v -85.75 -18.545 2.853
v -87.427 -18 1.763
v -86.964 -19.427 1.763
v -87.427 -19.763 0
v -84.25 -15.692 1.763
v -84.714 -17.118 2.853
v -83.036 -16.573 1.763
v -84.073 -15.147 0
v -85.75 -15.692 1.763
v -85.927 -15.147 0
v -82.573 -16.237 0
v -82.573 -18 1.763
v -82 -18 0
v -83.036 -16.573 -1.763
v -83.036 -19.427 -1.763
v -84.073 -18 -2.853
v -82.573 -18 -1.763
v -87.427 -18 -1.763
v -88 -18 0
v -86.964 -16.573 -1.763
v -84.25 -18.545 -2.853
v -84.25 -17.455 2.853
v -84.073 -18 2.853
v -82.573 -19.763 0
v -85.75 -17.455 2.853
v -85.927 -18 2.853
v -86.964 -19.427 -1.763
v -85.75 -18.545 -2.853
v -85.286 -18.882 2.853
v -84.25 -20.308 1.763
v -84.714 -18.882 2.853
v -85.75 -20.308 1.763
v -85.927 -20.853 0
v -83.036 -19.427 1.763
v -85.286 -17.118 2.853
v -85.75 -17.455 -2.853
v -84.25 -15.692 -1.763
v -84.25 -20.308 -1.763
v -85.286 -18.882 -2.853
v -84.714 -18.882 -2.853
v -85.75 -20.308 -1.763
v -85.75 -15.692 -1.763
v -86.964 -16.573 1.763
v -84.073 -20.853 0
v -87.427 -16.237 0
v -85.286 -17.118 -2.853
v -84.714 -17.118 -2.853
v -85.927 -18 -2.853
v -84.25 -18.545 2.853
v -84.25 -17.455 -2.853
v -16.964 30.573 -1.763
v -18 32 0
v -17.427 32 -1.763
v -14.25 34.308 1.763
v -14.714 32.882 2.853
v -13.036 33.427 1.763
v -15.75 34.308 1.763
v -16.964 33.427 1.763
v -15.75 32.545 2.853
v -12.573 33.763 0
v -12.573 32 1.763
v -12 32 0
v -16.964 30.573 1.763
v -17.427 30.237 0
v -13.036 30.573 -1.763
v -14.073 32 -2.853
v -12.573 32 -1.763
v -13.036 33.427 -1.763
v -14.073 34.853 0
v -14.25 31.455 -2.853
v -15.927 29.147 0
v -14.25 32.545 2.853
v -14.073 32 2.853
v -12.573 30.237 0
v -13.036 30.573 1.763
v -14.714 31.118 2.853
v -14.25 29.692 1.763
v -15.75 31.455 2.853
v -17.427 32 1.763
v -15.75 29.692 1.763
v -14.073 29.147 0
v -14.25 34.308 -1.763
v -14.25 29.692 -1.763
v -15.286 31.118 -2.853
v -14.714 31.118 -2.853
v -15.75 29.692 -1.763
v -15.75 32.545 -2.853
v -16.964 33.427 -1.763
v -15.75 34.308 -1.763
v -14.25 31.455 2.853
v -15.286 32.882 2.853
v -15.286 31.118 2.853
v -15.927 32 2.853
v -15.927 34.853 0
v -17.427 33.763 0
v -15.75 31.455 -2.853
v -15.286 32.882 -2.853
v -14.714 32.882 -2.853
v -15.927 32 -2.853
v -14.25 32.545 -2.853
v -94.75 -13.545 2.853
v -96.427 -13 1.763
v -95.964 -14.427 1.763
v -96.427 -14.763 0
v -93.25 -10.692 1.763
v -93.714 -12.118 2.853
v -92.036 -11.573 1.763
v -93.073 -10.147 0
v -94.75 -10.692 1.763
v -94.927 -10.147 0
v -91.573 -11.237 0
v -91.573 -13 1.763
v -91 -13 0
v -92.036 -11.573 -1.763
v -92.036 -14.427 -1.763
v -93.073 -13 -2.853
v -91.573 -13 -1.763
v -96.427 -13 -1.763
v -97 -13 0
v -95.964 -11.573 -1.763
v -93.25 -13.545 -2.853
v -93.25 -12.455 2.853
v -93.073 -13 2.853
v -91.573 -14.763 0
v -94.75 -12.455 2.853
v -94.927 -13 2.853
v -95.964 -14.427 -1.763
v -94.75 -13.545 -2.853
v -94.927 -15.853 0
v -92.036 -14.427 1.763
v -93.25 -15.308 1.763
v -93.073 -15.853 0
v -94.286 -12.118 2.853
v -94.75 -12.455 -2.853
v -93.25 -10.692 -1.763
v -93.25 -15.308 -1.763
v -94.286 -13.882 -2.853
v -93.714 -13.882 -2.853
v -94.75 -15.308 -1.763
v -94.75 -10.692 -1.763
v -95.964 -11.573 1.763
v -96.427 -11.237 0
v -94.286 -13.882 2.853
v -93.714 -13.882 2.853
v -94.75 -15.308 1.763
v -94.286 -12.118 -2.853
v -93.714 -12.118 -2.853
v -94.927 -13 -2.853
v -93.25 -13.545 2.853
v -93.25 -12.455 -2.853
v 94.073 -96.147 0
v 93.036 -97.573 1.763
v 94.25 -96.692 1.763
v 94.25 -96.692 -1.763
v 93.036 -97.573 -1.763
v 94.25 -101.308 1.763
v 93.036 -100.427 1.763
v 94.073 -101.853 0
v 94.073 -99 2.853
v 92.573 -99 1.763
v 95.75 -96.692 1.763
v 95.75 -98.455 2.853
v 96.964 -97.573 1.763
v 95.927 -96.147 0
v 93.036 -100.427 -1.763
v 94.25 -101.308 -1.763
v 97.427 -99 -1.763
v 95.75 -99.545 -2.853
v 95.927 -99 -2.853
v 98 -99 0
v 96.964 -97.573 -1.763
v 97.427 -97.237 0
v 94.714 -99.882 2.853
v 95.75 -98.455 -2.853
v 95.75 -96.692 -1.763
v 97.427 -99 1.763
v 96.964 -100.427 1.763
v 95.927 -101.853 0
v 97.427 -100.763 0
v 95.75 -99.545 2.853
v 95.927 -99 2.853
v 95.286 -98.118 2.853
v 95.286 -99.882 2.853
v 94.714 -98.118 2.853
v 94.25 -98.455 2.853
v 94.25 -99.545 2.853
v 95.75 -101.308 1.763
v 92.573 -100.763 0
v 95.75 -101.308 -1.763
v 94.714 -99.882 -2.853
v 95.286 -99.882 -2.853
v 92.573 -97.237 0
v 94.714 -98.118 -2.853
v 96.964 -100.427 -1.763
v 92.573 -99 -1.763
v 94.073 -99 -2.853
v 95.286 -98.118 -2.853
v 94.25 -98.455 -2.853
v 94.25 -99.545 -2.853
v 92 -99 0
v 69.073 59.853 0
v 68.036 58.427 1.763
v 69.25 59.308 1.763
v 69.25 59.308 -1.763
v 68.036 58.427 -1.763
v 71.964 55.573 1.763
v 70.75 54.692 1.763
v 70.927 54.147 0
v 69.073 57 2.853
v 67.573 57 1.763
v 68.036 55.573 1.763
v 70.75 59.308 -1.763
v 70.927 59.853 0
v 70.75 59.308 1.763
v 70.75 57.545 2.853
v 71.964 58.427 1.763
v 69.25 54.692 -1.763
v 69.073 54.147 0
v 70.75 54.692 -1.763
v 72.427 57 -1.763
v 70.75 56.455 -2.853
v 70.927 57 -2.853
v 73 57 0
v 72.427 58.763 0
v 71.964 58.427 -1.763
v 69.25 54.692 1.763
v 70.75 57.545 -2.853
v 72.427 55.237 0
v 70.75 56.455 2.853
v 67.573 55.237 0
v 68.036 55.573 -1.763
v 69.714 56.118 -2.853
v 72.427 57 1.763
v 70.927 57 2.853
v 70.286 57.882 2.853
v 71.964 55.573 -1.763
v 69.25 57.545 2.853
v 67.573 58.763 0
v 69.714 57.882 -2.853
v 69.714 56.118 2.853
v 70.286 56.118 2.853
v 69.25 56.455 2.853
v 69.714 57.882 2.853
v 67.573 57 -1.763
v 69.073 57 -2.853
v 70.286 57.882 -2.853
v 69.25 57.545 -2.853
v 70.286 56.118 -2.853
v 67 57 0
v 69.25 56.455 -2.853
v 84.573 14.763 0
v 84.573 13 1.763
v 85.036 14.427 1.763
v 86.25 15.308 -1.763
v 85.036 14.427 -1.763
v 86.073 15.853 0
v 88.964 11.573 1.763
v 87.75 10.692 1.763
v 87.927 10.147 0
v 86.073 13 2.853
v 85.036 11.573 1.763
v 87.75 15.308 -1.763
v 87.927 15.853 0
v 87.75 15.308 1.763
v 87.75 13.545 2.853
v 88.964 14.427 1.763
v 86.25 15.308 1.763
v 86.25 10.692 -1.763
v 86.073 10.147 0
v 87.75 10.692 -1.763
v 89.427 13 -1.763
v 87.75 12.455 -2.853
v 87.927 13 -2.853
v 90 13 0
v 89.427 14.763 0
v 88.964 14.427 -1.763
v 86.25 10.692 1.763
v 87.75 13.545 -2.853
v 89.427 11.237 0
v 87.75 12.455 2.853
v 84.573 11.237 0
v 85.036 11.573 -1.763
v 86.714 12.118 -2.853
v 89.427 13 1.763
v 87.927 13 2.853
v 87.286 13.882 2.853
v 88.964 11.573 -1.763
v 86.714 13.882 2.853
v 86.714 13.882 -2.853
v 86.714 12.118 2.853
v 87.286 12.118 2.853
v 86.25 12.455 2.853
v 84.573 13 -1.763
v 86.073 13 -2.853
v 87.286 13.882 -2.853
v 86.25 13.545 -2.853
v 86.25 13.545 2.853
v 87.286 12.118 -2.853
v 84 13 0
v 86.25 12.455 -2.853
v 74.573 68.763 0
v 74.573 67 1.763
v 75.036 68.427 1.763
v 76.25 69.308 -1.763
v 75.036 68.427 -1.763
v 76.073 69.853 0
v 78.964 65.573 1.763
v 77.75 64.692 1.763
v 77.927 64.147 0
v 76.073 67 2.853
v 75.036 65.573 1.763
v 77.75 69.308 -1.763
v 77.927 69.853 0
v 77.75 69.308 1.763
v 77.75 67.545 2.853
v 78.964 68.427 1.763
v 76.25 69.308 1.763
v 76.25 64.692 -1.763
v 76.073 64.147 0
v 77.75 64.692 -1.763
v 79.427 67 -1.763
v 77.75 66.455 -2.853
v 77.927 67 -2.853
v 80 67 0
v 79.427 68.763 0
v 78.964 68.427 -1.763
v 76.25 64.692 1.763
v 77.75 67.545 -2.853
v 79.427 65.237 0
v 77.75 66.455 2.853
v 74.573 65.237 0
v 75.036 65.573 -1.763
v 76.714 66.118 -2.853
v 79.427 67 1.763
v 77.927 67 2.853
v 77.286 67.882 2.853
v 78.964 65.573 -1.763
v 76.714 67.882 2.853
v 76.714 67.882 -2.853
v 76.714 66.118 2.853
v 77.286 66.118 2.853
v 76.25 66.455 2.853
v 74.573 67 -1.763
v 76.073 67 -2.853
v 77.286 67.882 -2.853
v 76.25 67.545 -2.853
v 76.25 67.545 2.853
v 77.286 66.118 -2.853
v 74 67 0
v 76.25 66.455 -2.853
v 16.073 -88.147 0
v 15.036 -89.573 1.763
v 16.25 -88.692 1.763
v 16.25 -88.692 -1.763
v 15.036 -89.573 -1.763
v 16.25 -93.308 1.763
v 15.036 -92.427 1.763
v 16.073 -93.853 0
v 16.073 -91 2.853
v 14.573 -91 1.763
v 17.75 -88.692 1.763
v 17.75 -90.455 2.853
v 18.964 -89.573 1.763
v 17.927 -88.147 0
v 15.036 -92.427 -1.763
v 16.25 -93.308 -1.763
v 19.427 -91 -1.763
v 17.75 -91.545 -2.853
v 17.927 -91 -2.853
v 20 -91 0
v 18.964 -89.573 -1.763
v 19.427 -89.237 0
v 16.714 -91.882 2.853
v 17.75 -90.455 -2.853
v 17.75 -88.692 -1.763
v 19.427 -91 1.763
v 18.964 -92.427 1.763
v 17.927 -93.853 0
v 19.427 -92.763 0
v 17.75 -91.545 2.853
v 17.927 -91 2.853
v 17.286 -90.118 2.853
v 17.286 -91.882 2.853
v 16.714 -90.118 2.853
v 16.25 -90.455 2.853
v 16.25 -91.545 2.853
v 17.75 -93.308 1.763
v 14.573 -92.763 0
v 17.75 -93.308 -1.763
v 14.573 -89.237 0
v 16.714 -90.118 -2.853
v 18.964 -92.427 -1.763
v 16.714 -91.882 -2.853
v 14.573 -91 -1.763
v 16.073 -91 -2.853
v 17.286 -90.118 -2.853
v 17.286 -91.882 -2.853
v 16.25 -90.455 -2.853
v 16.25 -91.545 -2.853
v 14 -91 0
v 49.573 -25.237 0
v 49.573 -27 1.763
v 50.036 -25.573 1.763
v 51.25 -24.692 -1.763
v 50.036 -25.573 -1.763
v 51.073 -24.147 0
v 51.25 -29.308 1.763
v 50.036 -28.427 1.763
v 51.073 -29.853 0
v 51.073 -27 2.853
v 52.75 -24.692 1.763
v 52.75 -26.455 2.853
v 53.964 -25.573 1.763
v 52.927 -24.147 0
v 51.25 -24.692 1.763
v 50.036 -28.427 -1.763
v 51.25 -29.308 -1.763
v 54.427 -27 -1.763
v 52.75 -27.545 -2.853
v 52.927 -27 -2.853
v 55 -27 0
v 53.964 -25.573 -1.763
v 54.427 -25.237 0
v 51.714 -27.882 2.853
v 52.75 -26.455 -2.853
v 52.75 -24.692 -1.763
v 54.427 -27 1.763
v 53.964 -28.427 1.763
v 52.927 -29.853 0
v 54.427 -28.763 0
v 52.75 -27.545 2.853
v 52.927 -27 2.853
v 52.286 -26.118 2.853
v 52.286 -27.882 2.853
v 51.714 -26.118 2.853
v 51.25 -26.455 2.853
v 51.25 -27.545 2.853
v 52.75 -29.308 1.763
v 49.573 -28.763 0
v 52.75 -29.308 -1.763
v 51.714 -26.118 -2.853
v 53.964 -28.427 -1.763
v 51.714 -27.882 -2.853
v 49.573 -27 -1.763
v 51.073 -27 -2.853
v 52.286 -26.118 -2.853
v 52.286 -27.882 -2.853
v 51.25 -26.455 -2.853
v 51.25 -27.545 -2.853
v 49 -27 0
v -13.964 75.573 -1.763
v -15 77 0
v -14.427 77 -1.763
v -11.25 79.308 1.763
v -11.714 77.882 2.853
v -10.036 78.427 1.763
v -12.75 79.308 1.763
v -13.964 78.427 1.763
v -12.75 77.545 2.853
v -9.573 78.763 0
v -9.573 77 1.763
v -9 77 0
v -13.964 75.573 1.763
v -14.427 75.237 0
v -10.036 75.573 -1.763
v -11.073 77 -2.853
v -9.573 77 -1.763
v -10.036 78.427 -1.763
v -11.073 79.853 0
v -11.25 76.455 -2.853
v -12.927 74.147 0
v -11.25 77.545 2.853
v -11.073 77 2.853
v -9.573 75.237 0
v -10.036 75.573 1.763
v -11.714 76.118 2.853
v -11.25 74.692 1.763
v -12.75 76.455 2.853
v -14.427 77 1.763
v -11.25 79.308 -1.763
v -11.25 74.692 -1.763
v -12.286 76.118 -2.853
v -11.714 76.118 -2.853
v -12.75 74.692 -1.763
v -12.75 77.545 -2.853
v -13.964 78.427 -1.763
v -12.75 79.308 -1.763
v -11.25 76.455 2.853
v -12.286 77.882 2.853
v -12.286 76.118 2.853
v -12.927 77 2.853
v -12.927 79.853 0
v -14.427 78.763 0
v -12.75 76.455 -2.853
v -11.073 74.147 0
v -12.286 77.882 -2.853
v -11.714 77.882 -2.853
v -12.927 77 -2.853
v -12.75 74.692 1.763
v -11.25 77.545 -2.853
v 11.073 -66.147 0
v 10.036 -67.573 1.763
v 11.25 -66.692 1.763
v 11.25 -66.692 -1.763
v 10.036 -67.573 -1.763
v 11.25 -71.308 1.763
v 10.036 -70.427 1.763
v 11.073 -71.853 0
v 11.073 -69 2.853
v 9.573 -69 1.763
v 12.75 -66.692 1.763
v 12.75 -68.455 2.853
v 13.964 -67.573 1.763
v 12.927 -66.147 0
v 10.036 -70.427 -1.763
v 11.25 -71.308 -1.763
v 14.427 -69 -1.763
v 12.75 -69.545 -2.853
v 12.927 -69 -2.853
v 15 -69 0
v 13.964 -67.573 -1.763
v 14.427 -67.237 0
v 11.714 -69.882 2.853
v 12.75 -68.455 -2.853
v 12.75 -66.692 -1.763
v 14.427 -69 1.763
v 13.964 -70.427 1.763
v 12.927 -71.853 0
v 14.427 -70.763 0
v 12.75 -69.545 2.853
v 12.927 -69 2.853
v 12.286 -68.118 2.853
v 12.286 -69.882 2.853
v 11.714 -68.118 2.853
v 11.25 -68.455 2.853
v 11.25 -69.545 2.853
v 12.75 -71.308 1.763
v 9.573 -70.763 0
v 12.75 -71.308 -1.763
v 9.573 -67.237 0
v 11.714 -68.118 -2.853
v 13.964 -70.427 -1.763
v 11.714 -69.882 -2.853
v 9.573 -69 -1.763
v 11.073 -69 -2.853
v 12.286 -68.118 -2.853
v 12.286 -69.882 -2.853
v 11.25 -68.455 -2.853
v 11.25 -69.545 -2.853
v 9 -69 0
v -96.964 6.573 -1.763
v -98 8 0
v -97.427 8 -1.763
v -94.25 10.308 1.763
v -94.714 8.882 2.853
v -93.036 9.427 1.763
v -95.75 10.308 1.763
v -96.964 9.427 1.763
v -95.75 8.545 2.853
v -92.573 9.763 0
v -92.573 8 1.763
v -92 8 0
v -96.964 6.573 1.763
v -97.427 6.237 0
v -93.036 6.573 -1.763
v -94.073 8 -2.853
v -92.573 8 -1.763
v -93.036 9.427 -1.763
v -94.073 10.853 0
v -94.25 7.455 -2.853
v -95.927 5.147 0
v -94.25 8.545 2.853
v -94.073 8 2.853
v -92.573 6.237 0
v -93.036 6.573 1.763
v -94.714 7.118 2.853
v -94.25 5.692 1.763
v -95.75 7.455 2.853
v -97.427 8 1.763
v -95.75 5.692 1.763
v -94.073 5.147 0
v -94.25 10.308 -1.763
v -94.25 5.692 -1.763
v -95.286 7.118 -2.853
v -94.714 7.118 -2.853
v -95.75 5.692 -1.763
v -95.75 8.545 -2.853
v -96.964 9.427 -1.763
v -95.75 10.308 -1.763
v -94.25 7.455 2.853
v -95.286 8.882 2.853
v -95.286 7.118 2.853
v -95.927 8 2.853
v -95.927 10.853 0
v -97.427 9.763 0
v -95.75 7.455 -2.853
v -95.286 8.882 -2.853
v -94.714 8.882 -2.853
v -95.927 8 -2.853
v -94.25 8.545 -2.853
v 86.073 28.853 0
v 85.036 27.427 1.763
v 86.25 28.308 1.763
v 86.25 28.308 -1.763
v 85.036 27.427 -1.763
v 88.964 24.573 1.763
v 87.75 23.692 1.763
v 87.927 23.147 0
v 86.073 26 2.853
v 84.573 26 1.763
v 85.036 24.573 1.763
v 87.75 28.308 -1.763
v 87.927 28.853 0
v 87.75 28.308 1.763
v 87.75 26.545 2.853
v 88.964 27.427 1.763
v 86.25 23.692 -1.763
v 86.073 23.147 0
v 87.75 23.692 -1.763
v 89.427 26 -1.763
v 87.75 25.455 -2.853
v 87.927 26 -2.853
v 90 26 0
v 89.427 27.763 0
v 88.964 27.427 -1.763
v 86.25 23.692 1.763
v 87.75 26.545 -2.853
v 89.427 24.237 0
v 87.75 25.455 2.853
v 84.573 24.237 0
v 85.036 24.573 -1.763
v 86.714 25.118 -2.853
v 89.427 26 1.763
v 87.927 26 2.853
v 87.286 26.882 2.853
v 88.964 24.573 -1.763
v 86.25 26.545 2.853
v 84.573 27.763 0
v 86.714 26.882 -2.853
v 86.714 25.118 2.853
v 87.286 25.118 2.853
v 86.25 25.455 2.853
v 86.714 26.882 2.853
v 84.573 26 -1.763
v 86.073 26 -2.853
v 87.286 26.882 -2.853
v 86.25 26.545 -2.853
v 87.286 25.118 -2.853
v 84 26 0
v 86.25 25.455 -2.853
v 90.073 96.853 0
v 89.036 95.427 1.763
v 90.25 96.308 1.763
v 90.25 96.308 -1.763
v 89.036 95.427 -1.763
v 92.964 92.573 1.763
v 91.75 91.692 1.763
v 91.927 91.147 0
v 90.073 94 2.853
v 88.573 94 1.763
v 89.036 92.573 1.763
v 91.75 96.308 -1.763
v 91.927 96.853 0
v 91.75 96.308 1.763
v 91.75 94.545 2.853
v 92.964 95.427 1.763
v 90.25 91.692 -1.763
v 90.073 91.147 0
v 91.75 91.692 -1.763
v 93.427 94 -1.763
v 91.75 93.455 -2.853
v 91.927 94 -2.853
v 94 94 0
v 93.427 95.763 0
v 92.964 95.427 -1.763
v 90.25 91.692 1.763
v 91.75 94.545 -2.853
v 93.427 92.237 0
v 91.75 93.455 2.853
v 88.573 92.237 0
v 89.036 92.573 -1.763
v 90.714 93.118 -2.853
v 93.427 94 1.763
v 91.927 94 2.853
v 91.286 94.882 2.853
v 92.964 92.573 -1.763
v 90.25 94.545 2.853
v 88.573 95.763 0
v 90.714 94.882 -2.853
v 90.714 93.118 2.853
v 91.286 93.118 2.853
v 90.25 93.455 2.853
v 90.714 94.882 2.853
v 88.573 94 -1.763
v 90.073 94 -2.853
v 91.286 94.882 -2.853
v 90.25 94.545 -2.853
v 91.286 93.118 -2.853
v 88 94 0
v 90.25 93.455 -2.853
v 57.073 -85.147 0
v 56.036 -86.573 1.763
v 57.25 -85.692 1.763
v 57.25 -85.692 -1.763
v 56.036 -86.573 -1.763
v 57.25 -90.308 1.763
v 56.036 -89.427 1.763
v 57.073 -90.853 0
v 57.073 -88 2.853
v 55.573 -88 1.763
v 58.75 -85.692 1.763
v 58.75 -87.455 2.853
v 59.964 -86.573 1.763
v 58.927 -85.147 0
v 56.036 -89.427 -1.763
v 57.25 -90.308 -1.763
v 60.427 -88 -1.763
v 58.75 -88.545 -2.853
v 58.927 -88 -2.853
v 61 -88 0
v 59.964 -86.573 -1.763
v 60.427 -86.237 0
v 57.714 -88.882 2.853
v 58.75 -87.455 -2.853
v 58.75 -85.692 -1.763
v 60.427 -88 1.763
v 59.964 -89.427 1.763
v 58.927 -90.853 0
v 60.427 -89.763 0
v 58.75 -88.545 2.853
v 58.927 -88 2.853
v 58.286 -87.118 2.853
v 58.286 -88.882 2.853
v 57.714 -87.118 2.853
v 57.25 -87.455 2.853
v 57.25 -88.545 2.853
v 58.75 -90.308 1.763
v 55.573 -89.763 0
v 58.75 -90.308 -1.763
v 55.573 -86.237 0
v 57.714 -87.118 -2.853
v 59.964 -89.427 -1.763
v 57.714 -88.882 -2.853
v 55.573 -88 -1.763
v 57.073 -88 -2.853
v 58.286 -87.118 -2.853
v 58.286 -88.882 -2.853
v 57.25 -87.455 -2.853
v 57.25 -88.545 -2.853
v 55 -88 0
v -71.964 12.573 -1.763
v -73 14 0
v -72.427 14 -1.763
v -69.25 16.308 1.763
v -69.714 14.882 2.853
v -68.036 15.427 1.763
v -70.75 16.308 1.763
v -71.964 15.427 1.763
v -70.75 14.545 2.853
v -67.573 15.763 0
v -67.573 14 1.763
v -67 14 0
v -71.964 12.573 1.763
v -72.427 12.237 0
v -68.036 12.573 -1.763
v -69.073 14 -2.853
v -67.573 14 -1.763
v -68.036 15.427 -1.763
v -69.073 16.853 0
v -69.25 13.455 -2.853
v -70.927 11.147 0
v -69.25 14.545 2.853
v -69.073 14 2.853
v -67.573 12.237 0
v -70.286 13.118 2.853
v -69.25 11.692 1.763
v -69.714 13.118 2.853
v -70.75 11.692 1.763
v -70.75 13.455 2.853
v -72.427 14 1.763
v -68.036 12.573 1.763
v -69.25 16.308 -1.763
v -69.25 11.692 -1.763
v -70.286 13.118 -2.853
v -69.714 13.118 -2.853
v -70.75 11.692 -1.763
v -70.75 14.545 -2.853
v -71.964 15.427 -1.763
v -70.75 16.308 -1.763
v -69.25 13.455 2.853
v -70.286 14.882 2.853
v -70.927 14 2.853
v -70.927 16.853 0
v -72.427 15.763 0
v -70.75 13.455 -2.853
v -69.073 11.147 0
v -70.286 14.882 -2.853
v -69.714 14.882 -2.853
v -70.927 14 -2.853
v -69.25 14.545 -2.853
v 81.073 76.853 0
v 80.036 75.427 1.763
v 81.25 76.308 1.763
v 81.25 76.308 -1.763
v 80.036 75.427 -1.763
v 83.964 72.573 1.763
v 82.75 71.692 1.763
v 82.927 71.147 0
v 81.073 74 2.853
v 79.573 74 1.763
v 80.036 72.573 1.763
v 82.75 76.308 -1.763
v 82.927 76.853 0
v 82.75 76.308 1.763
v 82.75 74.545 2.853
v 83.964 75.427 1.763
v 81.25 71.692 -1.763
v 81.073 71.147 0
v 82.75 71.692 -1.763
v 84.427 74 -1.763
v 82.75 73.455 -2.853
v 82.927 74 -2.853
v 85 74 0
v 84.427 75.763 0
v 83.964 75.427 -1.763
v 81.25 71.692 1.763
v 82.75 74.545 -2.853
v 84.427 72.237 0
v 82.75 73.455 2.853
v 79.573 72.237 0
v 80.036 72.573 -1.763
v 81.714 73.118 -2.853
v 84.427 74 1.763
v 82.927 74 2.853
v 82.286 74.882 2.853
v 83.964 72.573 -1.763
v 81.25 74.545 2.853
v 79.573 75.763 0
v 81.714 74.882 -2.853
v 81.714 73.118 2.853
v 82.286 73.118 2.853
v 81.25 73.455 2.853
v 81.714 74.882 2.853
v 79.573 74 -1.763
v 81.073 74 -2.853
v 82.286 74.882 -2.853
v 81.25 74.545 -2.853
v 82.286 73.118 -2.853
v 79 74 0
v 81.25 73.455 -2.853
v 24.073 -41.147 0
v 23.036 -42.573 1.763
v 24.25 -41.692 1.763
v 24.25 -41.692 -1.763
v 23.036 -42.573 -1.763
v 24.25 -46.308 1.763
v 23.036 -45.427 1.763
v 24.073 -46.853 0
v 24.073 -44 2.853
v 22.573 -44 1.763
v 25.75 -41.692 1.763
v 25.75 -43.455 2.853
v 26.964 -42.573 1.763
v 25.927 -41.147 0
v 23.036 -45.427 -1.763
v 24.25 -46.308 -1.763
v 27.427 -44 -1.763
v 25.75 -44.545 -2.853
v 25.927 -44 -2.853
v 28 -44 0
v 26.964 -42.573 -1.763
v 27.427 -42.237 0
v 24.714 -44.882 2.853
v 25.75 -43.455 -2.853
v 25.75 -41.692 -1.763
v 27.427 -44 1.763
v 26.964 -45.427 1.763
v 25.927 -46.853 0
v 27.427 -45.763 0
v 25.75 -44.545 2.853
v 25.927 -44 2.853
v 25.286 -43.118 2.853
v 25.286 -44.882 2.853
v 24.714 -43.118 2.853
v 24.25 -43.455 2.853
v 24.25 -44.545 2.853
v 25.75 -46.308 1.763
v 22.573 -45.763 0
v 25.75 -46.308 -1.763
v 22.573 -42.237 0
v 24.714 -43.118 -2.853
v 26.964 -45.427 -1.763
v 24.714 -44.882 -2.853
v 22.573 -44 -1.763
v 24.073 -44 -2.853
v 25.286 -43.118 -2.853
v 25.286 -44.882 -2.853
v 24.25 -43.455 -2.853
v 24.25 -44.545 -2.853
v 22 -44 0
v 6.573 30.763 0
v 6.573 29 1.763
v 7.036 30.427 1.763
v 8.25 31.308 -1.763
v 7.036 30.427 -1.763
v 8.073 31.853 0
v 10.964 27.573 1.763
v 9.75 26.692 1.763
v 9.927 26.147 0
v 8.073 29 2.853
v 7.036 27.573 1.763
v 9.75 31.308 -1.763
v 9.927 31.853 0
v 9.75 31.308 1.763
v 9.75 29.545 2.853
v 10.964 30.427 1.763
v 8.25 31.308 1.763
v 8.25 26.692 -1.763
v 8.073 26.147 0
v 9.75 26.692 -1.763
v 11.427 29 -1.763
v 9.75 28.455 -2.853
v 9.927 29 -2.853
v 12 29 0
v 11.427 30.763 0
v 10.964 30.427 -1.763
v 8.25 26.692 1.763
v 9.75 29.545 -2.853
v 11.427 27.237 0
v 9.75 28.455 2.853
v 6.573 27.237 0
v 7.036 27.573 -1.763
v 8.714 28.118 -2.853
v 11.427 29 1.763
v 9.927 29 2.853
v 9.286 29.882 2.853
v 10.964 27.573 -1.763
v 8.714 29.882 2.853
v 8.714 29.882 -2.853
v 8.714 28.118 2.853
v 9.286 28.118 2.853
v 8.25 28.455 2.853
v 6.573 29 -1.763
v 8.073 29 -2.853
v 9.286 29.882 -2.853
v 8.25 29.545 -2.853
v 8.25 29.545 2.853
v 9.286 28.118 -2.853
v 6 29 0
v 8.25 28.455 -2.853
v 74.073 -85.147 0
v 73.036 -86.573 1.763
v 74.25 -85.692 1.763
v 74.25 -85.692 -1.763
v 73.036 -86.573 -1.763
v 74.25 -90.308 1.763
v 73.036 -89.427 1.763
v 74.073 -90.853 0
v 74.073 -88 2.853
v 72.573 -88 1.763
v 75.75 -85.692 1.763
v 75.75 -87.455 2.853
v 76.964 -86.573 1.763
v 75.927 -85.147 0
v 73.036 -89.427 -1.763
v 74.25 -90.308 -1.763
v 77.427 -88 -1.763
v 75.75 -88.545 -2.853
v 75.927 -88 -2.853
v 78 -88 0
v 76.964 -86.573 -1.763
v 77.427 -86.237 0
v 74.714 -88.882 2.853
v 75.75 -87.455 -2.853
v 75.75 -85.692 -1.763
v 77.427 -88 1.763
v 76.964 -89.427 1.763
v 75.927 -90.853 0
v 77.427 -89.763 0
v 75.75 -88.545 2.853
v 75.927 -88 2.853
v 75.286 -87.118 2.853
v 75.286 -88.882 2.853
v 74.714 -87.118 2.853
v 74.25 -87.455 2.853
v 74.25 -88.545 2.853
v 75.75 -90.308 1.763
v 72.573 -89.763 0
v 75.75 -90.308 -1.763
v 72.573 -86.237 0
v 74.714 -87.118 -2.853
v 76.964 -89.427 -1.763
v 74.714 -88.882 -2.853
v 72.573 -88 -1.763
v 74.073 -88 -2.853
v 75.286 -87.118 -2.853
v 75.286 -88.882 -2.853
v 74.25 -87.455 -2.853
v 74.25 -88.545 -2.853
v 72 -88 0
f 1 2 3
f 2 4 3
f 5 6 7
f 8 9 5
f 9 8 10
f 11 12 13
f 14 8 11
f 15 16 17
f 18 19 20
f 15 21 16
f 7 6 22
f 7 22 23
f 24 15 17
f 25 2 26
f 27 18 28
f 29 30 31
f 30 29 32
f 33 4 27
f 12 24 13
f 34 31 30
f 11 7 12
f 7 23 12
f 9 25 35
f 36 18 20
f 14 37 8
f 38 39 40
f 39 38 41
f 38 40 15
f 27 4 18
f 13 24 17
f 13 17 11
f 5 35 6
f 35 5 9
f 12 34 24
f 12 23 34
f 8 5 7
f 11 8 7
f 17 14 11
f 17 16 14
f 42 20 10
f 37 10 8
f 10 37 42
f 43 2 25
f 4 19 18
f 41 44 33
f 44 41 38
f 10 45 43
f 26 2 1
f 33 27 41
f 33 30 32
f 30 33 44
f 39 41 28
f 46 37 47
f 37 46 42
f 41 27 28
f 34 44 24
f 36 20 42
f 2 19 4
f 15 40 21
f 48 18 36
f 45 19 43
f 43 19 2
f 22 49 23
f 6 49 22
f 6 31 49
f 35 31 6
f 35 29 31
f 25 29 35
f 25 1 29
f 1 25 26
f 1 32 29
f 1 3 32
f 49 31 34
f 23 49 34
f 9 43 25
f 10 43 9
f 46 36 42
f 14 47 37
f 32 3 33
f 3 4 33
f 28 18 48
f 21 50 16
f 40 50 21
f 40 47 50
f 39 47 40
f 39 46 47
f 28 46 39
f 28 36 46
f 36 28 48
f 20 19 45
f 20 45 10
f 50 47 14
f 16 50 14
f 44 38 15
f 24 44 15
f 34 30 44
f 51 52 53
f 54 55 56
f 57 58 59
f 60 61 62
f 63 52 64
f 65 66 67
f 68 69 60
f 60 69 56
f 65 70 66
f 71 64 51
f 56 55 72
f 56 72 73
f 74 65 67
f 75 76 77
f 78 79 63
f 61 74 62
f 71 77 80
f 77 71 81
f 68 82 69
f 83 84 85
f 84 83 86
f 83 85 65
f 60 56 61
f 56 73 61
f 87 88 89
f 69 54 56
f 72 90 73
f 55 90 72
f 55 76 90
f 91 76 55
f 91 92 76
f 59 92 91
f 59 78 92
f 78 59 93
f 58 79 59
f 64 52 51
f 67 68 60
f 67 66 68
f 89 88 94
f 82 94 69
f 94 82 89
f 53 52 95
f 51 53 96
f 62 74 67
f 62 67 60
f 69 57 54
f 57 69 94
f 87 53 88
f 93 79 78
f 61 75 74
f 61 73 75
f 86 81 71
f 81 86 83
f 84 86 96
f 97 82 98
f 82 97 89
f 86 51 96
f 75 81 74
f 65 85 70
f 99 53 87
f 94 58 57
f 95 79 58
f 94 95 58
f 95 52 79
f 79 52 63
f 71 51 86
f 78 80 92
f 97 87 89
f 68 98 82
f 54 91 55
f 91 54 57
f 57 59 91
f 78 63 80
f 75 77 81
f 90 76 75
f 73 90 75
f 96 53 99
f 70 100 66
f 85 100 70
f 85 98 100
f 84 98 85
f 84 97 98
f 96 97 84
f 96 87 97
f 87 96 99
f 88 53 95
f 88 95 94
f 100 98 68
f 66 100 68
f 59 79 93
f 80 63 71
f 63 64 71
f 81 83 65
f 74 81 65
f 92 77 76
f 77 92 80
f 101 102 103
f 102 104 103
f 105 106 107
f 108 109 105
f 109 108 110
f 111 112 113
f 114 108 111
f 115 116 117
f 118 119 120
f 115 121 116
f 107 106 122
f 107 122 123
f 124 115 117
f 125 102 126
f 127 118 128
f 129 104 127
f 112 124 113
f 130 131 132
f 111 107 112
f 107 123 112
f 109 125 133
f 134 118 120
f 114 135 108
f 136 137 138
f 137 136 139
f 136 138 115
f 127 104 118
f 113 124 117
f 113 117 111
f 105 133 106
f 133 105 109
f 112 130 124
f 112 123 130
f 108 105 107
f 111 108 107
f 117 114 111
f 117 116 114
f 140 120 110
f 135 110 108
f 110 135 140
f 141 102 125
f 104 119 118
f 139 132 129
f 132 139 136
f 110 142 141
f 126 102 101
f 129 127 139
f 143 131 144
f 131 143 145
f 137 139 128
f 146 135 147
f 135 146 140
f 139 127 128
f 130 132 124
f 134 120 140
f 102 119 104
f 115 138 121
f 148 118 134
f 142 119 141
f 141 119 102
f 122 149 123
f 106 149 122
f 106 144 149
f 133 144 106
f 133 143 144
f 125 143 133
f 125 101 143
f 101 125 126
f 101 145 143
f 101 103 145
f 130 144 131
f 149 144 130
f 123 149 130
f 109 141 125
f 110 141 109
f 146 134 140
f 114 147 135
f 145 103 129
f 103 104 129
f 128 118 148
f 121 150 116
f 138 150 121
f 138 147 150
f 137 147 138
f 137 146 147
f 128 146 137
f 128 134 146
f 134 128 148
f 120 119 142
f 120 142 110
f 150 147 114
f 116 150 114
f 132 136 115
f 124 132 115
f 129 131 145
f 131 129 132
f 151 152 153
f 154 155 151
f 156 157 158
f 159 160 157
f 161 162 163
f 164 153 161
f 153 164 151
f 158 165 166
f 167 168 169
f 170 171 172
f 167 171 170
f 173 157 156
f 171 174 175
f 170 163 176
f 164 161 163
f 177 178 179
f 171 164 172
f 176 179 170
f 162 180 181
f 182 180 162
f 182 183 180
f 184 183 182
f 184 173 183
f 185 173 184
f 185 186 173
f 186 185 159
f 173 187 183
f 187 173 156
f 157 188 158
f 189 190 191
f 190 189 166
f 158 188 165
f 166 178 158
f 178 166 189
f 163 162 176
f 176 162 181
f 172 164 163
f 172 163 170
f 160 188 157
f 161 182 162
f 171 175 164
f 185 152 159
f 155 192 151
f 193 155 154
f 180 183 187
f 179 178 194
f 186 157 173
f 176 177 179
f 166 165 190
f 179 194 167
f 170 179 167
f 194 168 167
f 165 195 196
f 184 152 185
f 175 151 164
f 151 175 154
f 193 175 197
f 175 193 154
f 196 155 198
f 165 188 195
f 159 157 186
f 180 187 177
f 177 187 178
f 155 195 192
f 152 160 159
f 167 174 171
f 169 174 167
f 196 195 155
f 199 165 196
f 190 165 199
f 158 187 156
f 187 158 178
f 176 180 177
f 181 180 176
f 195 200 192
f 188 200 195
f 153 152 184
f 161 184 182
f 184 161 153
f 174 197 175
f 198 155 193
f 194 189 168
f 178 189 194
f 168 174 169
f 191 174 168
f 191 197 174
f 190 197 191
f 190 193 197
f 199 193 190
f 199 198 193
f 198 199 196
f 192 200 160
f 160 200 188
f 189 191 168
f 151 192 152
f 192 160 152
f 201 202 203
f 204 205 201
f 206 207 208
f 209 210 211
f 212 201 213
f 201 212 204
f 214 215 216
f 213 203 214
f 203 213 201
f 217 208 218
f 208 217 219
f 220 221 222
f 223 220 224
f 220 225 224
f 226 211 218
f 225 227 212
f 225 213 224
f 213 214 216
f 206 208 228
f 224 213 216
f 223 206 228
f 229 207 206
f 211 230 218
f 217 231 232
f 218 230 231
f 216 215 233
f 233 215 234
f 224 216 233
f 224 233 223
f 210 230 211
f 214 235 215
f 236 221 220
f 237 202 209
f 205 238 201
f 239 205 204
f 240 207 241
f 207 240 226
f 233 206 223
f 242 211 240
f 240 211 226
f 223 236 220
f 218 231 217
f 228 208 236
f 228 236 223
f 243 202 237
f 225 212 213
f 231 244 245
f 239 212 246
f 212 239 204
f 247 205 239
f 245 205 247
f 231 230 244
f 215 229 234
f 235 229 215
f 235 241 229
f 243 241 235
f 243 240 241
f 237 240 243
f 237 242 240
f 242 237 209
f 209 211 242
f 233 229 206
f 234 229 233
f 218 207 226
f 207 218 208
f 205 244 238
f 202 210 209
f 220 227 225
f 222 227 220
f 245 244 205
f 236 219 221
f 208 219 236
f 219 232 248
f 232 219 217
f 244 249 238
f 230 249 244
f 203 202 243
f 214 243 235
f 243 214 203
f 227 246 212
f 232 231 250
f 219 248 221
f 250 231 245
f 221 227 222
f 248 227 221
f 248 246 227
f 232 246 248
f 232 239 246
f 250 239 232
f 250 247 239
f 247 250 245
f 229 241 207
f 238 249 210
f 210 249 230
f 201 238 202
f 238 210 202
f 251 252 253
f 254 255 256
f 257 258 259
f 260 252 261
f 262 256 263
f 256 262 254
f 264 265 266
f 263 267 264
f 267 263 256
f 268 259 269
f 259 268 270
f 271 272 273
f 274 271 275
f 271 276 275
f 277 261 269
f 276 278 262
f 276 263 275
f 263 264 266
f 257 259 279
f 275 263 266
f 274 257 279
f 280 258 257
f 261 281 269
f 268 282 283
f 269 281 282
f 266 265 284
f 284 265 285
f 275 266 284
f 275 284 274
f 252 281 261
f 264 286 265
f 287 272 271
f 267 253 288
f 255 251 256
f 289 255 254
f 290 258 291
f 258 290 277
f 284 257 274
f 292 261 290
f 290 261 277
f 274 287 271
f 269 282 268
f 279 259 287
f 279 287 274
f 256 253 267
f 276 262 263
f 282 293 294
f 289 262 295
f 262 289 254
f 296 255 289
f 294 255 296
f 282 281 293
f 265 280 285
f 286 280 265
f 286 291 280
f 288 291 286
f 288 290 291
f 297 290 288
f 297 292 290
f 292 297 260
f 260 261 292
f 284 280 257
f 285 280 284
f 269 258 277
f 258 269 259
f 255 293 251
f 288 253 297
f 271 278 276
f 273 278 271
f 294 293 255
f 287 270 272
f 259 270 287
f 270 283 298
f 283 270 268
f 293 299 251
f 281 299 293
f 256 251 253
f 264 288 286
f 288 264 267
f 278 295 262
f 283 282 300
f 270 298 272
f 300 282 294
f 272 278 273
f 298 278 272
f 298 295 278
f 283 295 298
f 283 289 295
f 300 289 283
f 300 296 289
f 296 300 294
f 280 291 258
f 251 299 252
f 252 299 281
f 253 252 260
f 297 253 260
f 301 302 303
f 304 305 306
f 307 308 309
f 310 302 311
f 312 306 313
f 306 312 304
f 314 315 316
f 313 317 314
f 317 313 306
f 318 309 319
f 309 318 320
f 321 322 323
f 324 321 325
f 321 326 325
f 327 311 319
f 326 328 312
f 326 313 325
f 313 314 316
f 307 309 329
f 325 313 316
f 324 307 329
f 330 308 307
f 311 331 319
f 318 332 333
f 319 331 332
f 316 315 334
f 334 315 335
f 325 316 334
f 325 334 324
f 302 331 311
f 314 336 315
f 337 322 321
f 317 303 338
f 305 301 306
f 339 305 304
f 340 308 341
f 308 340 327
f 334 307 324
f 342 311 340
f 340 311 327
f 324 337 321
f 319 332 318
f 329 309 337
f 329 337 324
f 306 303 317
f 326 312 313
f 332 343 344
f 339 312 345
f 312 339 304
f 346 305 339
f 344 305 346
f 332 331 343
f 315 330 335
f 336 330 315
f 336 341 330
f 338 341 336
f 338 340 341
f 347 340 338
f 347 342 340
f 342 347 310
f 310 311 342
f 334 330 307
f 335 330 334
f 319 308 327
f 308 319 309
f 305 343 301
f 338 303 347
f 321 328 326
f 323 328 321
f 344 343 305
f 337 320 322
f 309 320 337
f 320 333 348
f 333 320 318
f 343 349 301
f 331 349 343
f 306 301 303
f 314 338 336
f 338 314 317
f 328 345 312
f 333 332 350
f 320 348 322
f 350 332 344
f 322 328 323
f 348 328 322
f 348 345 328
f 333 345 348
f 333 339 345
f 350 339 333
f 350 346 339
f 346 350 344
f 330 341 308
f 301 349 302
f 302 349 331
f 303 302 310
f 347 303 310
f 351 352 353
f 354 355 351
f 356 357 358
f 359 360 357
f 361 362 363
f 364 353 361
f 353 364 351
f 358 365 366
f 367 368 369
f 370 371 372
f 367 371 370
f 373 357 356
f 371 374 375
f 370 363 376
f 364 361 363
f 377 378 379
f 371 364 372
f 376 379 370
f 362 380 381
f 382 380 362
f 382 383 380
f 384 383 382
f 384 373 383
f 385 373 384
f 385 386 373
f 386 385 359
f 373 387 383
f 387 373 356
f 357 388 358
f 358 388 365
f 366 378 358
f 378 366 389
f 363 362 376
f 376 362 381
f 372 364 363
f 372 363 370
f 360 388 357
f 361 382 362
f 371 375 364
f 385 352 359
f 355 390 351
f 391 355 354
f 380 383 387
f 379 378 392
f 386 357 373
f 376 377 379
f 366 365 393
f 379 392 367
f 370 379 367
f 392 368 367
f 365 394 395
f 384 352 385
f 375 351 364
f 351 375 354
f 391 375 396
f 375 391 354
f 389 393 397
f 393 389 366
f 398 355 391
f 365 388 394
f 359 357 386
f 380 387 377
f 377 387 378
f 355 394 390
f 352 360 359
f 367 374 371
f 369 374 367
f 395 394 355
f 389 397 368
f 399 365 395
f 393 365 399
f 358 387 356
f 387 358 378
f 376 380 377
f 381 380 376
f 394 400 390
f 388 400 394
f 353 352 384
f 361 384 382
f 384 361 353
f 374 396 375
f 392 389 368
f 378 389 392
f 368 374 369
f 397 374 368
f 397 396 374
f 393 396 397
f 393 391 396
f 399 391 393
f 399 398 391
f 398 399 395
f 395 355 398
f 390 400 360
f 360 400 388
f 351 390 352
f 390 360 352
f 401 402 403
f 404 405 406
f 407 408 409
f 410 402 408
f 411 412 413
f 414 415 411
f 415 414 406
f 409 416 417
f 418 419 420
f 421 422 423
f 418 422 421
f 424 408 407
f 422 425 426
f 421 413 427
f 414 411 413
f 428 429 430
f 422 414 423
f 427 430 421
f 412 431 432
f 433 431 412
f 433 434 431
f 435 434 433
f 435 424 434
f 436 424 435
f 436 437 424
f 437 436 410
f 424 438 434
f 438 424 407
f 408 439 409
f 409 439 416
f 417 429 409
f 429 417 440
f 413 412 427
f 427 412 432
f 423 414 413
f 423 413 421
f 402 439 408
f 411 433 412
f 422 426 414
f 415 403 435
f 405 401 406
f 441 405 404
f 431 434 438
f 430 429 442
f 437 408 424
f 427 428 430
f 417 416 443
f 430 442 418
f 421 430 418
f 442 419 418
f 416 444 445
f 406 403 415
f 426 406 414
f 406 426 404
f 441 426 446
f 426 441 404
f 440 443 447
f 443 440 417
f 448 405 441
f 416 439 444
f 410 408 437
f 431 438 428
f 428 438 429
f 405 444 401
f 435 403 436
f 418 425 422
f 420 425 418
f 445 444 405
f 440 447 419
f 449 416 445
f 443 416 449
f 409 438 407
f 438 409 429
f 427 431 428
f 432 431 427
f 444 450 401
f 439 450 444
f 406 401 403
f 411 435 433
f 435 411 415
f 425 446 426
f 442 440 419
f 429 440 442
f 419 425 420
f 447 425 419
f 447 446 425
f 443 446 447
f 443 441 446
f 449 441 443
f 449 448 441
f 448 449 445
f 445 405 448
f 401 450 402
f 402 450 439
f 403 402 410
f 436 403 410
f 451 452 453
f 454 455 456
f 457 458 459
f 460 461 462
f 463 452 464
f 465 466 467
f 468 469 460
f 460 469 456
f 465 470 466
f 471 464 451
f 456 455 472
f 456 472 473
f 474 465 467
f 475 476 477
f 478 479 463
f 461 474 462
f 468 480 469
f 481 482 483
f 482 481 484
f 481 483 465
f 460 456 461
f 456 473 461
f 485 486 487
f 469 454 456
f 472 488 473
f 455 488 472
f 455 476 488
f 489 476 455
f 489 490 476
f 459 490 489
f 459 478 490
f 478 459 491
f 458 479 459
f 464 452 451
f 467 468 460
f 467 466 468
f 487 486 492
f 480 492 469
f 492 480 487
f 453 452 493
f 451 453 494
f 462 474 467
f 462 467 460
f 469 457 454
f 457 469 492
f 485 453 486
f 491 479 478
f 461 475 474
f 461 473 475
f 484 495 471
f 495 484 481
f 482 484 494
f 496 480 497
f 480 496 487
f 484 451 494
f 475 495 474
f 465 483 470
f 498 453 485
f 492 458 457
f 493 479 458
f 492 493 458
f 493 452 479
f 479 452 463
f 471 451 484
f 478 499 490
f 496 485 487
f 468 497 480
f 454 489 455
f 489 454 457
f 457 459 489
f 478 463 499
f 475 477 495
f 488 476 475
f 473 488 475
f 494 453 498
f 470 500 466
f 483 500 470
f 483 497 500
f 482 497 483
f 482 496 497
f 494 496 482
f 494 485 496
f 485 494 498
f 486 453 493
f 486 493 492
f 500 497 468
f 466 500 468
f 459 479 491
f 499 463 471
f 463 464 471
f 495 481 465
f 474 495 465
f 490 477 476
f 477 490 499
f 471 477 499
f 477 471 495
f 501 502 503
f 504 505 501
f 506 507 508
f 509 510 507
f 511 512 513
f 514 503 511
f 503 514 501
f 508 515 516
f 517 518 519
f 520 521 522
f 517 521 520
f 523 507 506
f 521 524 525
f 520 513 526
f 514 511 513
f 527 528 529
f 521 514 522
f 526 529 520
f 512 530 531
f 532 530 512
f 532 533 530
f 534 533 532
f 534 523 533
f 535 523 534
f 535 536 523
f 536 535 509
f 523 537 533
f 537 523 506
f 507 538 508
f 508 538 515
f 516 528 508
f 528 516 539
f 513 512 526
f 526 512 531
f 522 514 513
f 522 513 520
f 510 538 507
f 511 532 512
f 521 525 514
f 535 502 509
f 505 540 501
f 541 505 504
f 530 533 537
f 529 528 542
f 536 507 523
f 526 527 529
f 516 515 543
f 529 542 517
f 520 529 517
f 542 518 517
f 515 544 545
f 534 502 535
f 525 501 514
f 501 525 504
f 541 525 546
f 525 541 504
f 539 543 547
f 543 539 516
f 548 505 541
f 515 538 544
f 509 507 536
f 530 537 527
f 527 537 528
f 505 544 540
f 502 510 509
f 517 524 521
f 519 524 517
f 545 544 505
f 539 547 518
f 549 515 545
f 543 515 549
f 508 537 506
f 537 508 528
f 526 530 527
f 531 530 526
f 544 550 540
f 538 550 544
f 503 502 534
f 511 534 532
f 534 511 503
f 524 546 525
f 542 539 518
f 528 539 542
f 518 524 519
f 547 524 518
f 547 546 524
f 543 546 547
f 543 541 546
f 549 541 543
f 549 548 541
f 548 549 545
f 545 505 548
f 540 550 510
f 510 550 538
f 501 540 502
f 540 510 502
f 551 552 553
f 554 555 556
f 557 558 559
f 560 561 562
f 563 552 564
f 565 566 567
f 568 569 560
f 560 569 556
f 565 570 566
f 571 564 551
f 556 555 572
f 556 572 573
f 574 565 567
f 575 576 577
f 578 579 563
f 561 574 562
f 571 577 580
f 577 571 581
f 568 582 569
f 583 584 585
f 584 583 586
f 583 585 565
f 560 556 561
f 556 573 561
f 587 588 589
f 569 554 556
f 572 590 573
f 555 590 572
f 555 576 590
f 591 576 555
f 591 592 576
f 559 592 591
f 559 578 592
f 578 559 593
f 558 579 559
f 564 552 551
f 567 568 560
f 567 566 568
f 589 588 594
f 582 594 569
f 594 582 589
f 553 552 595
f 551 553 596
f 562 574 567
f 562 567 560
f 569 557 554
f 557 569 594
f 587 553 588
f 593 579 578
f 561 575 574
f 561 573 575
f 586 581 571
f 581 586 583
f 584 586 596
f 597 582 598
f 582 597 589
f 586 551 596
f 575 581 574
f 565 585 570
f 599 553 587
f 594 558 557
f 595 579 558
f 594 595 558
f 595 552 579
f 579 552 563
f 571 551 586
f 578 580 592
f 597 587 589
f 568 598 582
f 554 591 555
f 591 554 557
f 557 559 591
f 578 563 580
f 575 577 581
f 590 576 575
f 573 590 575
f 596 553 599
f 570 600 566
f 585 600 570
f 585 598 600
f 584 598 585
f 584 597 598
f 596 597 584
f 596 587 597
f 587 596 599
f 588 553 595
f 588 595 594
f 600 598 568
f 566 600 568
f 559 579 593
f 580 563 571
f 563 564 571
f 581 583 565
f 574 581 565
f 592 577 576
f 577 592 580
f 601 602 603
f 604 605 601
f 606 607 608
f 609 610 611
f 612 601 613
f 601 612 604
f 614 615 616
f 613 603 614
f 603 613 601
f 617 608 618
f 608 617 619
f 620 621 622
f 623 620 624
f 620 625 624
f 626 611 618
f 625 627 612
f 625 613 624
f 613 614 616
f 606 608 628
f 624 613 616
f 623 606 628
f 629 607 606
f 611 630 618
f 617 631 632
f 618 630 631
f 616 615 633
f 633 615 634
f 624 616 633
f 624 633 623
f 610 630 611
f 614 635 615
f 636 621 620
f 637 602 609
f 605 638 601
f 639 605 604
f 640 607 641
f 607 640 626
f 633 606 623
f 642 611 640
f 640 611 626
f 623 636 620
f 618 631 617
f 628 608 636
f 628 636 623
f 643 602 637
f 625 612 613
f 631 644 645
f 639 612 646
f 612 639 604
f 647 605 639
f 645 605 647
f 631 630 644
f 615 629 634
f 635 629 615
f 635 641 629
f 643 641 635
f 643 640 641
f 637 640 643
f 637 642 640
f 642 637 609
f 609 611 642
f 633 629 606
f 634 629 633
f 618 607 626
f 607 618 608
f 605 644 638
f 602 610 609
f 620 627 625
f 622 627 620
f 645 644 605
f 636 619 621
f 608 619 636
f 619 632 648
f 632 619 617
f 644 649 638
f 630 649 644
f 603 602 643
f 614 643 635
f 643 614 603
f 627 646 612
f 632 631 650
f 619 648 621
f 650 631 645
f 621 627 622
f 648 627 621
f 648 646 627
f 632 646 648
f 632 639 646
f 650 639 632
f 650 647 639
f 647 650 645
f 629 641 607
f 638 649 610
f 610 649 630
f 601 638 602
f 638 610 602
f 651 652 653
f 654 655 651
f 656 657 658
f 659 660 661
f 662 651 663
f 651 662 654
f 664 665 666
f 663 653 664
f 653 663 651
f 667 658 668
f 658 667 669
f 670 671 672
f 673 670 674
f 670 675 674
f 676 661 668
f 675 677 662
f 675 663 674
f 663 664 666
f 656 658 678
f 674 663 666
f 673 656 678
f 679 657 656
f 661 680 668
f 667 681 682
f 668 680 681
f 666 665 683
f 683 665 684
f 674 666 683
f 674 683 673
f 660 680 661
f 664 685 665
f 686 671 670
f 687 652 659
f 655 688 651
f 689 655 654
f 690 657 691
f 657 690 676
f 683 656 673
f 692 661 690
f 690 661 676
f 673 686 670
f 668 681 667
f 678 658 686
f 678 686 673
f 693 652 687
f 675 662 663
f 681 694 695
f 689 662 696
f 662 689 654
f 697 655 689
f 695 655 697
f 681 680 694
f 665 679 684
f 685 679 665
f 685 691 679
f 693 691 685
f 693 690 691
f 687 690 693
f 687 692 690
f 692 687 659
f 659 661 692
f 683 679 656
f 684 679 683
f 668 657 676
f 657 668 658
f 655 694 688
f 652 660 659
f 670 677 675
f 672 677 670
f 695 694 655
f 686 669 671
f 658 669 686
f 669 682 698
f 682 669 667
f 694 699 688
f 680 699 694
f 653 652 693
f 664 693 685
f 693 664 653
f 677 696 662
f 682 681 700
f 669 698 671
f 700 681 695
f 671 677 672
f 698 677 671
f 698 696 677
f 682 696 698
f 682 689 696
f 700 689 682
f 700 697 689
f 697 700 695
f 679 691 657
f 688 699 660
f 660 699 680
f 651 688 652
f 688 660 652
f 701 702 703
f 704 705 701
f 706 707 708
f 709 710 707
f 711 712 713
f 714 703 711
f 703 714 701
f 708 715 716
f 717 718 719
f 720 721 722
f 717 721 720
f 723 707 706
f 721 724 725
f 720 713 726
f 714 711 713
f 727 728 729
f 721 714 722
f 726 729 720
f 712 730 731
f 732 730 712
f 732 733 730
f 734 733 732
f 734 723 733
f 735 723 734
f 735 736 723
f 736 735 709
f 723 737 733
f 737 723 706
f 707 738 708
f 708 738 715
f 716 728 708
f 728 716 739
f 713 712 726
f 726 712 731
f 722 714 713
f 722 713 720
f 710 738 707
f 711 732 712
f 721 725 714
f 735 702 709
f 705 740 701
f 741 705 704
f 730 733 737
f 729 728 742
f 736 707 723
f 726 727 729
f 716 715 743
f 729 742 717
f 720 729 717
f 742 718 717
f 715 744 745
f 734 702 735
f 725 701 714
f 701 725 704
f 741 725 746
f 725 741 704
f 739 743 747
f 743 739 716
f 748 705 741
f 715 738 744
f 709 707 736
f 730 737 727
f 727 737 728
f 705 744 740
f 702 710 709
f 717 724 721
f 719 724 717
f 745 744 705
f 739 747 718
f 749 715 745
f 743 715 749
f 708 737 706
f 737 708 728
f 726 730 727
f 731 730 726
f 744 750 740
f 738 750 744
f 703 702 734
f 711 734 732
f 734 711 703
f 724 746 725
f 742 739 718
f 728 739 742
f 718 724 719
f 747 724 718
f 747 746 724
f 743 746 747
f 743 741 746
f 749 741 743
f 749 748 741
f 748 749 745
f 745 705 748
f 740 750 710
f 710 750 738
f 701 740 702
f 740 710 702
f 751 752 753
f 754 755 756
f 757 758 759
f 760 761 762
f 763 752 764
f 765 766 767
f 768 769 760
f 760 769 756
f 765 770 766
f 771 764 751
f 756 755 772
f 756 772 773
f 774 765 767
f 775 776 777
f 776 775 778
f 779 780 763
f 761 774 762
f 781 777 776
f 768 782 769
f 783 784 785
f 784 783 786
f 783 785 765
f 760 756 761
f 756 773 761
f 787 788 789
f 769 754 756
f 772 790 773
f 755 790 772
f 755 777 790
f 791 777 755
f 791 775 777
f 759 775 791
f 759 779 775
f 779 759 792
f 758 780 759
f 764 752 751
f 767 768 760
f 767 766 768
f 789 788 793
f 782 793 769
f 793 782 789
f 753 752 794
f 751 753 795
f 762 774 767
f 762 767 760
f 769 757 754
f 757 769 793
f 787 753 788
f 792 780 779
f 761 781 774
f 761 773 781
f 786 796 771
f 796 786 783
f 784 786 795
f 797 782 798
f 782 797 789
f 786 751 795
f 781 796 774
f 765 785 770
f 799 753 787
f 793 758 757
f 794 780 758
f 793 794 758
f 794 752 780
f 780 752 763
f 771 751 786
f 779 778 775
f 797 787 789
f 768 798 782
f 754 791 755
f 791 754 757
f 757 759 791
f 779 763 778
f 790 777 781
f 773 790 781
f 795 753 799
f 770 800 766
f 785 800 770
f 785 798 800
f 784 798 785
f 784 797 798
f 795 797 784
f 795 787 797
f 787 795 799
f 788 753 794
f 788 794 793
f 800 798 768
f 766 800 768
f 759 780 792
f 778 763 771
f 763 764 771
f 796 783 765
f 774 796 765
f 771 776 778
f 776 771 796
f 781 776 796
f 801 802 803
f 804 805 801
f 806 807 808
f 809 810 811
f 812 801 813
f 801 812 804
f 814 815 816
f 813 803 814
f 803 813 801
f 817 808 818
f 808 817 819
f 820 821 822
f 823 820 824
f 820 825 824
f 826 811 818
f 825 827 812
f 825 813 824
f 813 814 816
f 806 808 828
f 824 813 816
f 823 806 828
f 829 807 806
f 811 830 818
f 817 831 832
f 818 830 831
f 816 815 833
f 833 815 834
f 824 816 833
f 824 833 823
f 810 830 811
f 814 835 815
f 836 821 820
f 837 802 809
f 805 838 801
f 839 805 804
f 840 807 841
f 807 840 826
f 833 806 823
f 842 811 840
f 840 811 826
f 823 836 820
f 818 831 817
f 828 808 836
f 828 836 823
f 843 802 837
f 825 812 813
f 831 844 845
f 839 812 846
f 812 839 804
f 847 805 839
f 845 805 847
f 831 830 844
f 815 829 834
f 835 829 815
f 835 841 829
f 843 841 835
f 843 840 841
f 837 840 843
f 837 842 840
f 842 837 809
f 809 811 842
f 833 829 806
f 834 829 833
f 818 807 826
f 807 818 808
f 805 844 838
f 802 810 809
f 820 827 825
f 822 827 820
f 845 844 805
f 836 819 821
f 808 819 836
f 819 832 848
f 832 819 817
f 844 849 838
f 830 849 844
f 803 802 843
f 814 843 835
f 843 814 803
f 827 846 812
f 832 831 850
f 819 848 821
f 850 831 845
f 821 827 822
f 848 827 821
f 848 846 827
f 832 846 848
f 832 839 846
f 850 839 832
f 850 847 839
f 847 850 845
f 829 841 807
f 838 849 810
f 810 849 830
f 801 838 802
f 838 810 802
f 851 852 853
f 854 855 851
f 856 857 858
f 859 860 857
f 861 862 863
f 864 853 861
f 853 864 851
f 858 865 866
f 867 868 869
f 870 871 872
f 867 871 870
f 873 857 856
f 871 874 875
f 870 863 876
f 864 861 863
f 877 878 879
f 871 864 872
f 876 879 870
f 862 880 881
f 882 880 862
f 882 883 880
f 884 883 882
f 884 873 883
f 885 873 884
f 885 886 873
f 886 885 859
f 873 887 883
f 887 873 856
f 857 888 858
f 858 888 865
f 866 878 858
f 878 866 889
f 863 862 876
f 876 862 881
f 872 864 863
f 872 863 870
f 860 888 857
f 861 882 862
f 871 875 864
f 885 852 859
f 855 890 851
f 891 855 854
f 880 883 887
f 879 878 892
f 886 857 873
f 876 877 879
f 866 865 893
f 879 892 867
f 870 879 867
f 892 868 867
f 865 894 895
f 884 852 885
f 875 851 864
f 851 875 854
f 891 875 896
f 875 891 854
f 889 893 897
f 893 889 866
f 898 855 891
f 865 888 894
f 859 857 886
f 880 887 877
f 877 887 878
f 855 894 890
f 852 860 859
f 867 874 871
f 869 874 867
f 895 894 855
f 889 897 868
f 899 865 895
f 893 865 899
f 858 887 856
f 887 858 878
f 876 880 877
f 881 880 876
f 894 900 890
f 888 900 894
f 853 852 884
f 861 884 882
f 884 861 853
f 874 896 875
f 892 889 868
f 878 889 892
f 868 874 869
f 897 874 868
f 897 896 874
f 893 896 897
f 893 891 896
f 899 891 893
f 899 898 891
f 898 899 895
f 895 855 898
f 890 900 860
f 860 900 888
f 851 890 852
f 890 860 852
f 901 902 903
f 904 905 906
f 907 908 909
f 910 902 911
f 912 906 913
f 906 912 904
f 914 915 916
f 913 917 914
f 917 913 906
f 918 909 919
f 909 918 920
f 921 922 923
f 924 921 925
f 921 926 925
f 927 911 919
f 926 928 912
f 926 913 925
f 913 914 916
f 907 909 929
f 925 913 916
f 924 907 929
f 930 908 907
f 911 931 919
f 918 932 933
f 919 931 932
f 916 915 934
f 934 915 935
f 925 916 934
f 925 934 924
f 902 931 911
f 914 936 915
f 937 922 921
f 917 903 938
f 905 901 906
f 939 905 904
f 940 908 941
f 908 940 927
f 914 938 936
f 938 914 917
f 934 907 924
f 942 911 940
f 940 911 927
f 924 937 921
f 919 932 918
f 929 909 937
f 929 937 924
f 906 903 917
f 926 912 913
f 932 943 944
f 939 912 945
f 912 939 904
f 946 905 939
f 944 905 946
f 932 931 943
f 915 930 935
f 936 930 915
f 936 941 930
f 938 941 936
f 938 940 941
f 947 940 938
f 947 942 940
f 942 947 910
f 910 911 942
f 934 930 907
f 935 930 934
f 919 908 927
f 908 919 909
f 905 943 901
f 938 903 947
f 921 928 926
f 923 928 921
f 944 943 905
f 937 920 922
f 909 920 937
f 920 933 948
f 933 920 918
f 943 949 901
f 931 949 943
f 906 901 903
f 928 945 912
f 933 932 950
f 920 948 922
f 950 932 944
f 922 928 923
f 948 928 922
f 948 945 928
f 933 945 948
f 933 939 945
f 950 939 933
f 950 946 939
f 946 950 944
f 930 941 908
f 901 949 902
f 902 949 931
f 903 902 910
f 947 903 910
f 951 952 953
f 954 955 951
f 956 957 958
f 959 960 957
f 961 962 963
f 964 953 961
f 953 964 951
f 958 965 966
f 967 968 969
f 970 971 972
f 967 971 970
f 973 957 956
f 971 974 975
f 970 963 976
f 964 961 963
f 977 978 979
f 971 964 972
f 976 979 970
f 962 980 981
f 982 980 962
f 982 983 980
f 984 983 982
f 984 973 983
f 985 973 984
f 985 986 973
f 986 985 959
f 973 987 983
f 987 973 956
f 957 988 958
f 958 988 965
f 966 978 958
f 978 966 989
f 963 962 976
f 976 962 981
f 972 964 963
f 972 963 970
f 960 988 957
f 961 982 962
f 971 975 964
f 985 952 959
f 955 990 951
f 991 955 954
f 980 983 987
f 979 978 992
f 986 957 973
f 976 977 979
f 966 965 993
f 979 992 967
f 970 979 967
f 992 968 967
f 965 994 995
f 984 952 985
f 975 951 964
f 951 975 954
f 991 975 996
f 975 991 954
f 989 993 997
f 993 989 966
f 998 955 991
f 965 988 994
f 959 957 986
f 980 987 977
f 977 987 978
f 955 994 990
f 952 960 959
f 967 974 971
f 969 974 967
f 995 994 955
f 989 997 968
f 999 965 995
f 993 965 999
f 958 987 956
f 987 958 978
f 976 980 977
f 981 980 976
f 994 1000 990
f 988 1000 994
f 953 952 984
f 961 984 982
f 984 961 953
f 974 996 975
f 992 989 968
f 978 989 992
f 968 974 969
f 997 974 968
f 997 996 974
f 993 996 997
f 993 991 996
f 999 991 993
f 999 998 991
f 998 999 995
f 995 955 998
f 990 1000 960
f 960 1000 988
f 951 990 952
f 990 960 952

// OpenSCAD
//random points---------------------------------
function rnd_v(init_value,end_value)=round(rands(init_value,end_value,1)[0]);

init_value=-100;
end_value=100;
points_num=20;

points=[
for(i=[0:points_num-1]
    )
    [rnd_v(init_value,end_value),
     rnd_v(init_value,end_value)
    ]];
for(i=points)
    translate(i)
        sphere(3);
//----------------------------------------------

//quick_sort------------------------------------

function quick_sort(points)=
     let(leng=len(points)-1)
     leng<1? points:
     let(pivot=points[0])
     let(before=[for(i=[1:leng])
                 if(compare(points[i],pivot))
                     points[i]
                 ])
     let(after=[for(i=[1:leng])
                if(compare(points[i],pivot)==false)
                    points[i]
                ])  
      [each quick_sort(before),pivot,each quick_sort(after)];          
//---------------------------------------------------


//lower。find the lowest/leftmost point.
function compare(pa,pb)=
         pa.y<pb.y || (pa.y==pb.y && pa.x<pb.x)? true: false;
                
function hypo(x,y)=
     pow(pow(x,2)+pow(y,2),0.5);

//兩點距離的平方
function hypo2(p1,p2)=
     pow(p1.x-p2.x,2)+pow(p1.y-p2.y,2);

//向量OA叉積向量OB。大於零表示OA到OB為逆時針旋轉。
function cross_(po,pa,pb)=
     (pa.x-po.x)*(pb.y-po.y)-(pa.y-po.y)*(pb.x-po.x);

function append(array,num)=[for(i=array) i,num];

function far(po,pa,pb)=
     hypo2(po,pa)>hypo2(po,pb)? true:false;


function gift_wrapping(points)=
     let(array=quick_sort(points))
     let(init=0)
     let(index=0)
     let(leng=len(array)-1)
     leng<=0?array:
     let(start_p=array[init])
     let(convex_points=[start_p])
     gift_wrapping_inner(init,index+1,leng,start_p,convex_points,array);     

function gift_wrapping_inner(init,index,leng,start_p,convex_points,array)=
    index>leng? convex_points:
    let(next_p=next_convex_point(start_p,init,leng,array))
    let(convex_points_=append(convex_points,next_p))
    gift_wrapping_inner(init,index+1,leng,next_p,convex_points_,array);

function next_convex_point(start_p,index,leng,array)=
    let(next_p=array[index])
    next_convex_point_inner(start_p,next_p,index+1,leng,array);
function next_convex_point_inner(start_p,next_p,index,leng,array)=    
    index>leng? next_p:
    let(test_p=array[index])
    let(c=cross_(start_p,next_p,test_p))
    c>0  || (c==0 && far(start_p,test_p,next_p))?
    next_convex_point_inner(start_p,test_p,index+1,leng,array):
    next_convex_point_inner(start_p,next_p,index+1,leng,array);
    

convex=gift_wrapping(points);
for(i=convex)
    translate(i)
         color("red")
             sphere(3);
